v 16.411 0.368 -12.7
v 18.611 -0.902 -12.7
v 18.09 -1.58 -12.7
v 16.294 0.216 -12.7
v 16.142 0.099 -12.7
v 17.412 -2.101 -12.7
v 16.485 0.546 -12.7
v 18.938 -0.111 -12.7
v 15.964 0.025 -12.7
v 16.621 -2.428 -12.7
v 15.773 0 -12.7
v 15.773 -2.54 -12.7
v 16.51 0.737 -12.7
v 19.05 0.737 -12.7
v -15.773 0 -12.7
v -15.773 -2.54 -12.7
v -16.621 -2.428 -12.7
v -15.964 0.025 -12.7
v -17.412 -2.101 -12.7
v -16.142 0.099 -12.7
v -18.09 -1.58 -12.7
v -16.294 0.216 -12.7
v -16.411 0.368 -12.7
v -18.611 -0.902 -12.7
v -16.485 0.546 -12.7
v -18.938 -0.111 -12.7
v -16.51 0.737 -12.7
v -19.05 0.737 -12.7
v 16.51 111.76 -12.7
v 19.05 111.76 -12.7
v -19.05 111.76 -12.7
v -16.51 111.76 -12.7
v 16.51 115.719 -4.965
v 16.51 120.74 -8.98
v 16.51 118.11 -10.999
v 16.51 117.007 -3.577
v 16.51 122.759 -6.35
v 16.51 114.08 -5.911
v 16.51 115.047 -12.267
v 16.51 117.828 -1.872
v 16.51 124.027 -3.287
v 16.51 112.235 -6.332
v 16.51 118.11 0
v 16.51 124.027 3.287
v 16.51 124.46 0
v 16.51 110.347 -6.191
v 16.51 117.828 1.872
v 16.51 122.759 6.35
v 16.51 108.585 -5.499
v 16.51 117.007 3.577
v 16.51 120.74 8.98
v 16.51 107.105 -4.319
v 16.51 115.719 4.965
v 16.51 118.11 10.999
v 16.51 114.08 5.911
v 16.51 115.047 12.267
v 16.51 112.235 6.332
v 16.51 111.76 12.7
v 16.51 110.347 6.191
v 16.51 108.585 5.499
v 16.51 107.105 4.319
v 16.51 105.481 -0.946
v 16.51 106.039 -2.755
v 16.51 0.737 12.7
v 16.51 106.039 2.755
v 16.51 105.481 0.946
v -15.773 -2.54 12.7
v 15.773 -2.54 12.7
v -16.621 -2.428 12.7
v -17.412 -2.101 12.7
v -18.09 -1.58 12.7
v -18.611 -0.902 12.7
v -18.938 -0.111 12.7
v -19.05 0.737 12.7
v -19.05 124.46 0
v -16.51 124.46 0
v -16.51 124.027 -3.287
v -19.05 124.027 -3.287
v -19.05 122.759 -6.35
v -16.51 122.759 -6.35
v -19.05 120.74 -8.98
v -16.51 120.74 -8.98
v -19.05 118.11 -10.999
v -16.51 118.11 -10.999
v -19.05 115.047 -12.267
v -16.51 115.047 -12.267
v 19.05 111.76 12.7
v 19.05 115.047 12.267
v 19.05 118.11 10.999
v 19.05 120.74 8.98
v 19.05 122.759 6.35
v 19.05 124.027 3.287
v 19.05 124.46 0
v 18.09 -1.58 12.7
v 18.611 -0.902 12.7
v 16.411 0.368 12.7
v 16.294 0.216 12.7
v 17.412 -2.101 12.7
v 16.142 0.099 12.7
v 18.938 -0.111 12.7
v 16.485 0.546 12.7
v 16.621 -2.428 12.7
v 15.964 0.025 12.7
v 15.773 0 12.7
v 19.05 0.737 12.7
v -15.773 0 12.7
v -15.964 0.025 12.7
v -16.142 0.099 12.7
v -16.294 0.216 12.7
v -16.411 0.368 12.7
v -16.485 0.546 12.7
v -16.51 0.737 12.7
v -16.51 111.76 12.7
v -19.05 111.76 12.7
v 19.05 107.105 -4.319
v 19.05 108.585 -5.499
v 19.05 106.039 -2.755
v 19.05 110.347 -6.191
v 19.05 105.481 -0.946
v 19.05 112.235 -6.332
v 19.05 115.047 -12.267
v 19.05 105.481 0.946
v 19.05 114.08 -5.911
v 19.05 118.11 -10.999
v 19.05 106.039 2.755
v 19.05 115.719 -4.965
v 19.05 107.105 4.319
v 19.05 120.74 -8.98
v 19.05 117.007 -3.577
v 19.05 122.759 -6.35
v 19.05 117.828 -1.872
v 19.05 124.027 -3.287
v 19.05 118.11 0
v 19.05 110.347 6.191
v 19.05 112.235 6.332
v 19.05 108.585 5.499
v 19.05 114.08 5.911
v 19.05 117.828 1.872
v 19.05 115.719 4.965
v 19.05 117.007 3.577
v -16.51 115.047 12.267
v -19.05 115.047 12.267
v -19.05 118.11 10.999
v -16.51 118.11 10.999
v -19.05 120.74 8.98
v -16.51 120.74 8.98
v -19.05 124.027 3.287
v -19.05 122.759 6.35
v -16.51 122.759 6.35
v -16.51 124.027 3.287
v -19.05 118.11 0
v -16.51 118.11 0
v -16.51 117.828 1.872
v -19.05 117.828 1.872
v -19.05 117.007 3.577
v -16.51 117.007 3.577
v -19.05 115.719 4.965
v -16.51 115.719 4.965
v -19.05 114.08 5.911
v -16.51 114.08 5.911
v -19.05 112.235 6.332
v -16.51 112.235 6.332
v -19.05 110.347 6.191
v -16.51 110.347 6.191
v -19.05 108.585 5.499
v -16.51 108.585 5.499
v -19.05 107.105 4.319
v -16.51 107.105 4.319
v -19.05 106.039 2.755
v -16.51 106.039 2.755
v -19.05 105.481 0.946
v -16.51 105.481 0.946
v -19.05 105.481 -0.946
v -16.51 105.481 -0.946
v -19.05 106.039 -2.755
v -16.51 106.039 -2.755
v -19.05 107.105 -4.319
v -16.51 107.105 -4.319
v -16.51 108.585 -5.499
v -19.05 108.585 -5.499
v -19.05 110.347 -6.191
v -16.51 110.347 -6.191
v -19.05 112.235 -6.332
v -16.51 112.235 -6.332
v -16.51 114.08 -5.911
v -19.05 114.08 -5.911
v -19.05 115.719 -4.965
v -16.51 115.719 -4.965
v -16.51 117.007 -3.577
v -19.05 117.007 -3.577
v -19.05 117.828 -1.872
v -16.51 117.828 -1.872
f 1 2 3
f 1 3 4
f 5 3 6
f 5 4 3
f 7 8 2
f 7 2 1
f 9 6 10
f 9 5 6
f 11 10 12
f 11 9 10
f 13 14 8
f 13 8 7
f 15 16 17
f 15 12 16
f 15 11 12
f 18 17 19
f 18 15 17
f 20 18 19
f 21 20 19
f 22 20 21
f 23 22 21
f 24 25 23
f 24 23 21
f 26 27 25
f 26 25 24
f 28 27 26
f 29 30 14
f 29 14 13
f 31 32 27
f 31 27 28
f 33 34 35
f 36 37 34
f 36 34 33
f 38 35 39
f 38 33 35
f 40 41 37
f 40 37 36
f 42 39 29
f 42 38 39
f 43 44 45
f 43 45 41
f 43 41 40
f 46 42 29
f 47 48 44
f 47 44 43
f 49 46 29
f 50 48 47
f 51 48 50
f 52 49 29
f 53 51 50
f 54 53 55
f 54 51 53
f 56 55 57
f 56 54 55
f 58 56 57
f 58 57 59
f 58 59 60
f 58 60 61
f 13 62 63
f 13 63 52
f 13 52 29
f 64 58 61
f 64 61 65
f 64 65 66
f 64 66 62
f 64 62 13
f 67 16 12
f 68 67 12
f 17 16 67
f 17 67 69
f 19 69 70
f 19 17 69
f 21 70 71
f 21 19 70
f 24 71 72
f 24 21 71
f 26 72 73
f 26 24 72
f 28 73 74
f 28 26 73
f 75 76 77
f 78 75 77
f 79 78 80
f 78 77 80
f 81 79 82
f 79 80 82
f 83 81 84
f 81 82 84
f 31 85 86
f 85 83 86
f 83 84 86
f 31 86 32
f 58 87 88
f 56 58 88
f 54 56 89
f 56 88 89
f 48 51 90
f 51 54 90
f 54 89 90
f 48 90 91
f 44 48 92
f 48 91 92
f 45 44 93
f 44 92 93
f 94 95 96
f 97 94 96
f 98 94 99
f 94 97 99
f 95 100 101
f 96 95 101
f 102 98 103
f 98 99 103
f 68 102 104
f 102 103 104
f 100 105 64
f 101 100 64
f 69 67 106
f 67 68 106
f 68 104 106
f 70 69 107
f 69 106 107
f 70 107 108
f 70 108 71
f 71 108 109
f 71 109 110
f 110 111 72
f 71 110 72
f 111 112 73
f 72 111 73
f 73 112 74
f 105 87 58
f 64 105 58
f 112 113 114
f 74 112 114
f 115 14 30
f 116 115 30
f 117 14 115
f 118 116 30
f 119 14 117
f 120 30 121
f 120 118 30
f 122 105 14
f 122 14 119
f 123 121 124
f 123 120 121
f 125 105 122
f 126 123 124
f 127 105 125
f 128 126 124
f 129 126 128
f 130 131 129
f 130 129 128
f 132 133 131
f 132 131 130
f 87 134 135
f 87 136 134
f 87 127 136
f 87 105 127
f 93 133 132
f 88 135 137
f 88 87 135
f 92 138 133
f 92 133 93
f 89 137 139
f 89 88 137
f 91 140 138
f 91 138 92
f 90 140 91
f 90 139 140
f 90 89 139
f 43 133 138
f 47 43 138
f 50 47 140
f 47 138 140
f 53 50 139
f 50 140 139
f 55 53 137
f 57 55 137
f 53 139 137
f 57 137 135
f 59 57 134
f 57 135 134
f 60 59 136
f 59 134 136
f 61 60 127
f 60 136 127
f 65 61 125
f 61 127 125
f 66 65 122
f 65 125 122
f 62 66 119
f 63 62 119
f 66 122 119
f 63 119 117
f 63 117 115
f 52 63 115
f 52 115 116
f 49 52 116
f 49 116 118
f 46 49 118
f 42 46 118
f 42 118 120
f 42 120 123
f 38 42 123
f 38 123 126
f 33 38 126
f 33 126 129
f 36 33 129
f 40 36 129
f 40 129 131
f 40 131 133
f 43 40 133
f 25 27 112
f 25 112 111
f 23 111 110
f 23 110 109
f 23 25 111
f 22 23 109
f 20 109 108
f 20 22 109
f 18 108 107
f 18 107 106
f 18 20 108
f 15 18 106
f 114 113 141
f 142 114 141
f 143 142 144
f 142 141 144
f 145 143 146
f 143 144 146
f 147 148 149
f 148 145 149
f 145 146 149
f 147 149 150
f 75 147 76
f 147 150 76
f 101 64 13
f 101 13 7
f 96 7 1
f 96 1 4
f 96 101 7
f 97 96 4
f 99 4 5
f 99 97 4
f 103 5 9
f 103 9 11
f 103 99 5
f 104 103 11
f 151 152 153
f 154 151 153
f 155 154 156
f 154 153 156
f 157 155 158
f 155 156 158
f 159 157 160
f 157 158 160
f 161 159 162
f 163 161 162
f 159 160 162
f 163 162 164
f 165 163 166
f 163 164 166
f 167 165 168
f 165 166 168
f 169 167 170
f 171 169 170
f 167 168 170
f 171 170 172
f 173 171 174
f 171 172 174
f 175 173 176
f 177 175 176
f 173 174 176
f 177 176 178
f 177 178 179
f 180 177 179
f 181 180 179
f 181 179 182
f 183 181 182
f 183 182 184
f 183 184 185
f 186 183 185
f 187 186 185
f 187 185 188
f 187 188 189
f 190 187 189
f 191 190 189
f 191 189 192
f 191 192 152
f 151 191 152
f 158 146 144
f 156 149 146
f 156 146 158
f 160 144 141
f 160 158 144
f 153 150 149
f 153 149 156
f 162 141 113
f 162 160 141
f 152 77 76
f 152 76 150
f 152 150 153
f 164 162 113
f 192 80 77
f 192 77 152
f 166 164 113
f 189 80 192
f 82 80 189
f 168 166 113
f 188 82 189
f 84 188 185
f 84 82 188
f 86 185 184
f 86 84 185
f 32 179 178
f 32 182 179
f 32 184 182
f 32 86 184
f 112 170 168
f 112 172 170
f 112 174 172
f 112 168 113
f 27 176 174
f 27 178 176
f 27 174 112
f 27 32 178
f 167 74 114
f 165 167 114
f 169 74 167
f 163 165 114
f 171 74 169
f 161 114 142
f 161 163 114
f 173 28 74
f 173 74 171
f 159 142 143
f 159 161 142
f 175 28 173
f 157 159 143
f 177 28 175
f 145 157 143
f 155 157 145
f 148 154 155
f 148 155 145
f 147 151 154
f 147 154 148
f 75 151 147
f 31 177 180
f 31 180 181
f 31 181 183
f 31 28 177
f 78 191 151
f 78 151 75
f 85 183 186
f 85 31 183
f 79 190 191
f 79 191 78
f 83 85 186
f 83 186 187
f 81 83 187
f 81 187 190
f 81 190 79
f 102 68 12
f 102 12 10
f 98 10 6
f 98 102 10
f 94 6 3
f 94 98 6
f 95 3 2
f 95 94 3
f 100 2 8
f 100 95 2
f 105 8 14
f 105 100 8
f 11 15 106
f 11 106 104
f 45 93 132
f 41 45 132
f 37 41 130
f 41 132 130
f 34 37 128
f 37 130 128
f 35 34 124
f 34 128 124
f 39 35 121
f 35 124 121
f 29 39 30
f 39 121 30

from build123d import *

# Parameters (mm, degrees)
SKETCH2_W                      = 38.1
SKETCH2_H                      = 25.4
BASE_FLANGE1_DEPTH             = 2.54
EDGE_FLANGE1_STRIP_W           = 11.6332
EDGE_FLANGE1_STRIP_H           = 2.54
EDGE_FLANGE1_STRIP_CUT_DEPTH   = 25.4
EDGE_FLANGE1_STRIP_2_W         = 11.6332
EDGE_FLANGE1_STRIP_2_H         = 2.54
EDGE_FLANGE1_STRIP_CUT_2_DEPTH = 25.4
EDGE_FLANGE1_DEPTH             = 25.4
EDGE_FLANGE1_BEND_DEPTH        = 25.4
CUT_EXTRUDE1_DEPTH             = 131.779171124
SKETCH14_R                     = 6.35
CUT_EXTRUDE2_DEPTH             = 131.779171124


# Sheet-metal steps are written as plain solids
with BuildPart() as part:
    # Sketch2 → Base-Flange1 (new body)
    with BuildSketch(Plane(origin=(0, 0, 0), x_dir=(1, 0, 0), z_dir=(0, 1, 0))):
        Rectangle(SKETCH2_W, SKETCH2_H)
    extrude(amount=-BASE_FLANGE1_DEPTH)

    # Edge-Flange1 strip (across the edge) → Edge-Flange1 strip cut (cut)
    with BuildSketch(Plane(origin=(19.05, 0, 12.7), x_dir=(-1, 0, 0), z_dir=(0, 0, -1))):
        with Locations((-2.54, -1.27)):
            Rectangle(EDGE_FLANGE1_STRIP_W, EDGE_FLANGE1_STRIP_H)
    extrude(amount=EDGE_FLANGE1_STRIP_CUT_DEPTH, mode=Mode.SUBTRACT)

    # Edge-Flange1 strip 2 (across the edge) → Edge-Flange1 strip cut 2 (cut)
    with BuildSketch(Plane(origin=(-19.05, 0, -12.7), x_dir=(1, 0, 0), z_dir=(0, 0, 1))):
        with Locations((-2.54, -1.27)):
            Rectangle(EDGE_FLANGE1_STRIP_2_W, EDGE_FLANGE1_STRIP_2_H)
    extrude(amount=EDGE_FLANGE1_STRIP_CUT_2_DEPTH, mode=Mode.SUBTRACT)

    # Edge-Flange1 section (across the edge) → Edge-Flange1 (add)
    with BuildSketch(Plane(origin=(19.05, 0, 12.7), x_dir=(-1, 0, 0), z_dir=(0, 0, -1))):
        with BuildLine():
            Line((0, 0.7366), (0, 124.46))
            Line((0, 124.46), (2.54, 124.46))
            Line((2.54, 124.46), (2.54, 0.7366))
            ThreePointArc((2.54, 0.7366), (2.755745145, 0.215745145), (3.2766, 0))
            Line((3.2766, 0), (3.2766, -2.54))
            ThreePointArc((3.2766, -2.54), (0.959693921, -1.580306079), (0, 0.7366))
        make_face()
    extrude(amount=EDGE_FLANGE1_DEPTH)

    # Edge-Flange1 section 2 (across the edge) → Edge-Flange1 bend (add)
    with BuildSketch(Plane(origin=(-19.05, 0, -12.7), x_dir=(1, 0, 0), z_dir=(0, 0, 1))):
        with BuildLine():
            Line((0, 0.7366), (0, 124.46))
            Line((0, 124.46), (2.54, 124.46))
            Line((2.54, 124.46), (2.54, 0.7366))
            ThreePointArc((2.54, 0.7366), (2.755745145, 0.215745145), (3.2766, 0))
            Line((3.2766, 0), (3.2766, -2.54))
            ThreePointArc((3.2766, -2.54), (0.959693921, -1.580306079), (0, 0.7366))
        make_face()
    extrude(amount=EDGE_FLANGE1_BEND_DEPTH)

    # Sketch13 → Cut-Extrude1 (cut, through all)
    with BuildSketch(Plane(origin=(19.05, 0, 0), x_dir=(0, 0, -1), z_dir=(1, 0, 0))):
        with BuildLine():
            ThreePointArc((-2.4e-08, 124.46), (8.980256112, 120.74025613), (12.7, 111.76))
            Line((12.7, 111.76), (12.7, 124.46))
            Line((12.7, 124.46), (-2.4e-08, 124.46))
        make_face()
        with BuildLine():
            Line((-12.7, 124.46), (-12.7, 111.76))
            ThreePointArc((-12.7, 111.76), (-8.98025613, 120.740256112), (-2.4e-08, 124.46))
            Line((-2.4e-08, 124.46), (-12.7, 124.46))
        make_face()
    extrude(amount=-CUT_EXTRUDE1_DEPTH, mode=Mode.SUBTRACT)

    # Sketch14 → Cut-Extrude2 (cut, through all)
    with BuildSketch(Plane(origin=(19.05, 0, 0), x_dir=(0, 0, -1), z_dir=(1, 0, 0))):
        with Locations(Location((0, 111.76, 0), (0, 0, 90))):
            Circle(SKETCH14_R)
    extrude(amount=-CUT_EXTRUDE2_DEPTH, mode=Mode.SUBTRACT)


solid = part.part
